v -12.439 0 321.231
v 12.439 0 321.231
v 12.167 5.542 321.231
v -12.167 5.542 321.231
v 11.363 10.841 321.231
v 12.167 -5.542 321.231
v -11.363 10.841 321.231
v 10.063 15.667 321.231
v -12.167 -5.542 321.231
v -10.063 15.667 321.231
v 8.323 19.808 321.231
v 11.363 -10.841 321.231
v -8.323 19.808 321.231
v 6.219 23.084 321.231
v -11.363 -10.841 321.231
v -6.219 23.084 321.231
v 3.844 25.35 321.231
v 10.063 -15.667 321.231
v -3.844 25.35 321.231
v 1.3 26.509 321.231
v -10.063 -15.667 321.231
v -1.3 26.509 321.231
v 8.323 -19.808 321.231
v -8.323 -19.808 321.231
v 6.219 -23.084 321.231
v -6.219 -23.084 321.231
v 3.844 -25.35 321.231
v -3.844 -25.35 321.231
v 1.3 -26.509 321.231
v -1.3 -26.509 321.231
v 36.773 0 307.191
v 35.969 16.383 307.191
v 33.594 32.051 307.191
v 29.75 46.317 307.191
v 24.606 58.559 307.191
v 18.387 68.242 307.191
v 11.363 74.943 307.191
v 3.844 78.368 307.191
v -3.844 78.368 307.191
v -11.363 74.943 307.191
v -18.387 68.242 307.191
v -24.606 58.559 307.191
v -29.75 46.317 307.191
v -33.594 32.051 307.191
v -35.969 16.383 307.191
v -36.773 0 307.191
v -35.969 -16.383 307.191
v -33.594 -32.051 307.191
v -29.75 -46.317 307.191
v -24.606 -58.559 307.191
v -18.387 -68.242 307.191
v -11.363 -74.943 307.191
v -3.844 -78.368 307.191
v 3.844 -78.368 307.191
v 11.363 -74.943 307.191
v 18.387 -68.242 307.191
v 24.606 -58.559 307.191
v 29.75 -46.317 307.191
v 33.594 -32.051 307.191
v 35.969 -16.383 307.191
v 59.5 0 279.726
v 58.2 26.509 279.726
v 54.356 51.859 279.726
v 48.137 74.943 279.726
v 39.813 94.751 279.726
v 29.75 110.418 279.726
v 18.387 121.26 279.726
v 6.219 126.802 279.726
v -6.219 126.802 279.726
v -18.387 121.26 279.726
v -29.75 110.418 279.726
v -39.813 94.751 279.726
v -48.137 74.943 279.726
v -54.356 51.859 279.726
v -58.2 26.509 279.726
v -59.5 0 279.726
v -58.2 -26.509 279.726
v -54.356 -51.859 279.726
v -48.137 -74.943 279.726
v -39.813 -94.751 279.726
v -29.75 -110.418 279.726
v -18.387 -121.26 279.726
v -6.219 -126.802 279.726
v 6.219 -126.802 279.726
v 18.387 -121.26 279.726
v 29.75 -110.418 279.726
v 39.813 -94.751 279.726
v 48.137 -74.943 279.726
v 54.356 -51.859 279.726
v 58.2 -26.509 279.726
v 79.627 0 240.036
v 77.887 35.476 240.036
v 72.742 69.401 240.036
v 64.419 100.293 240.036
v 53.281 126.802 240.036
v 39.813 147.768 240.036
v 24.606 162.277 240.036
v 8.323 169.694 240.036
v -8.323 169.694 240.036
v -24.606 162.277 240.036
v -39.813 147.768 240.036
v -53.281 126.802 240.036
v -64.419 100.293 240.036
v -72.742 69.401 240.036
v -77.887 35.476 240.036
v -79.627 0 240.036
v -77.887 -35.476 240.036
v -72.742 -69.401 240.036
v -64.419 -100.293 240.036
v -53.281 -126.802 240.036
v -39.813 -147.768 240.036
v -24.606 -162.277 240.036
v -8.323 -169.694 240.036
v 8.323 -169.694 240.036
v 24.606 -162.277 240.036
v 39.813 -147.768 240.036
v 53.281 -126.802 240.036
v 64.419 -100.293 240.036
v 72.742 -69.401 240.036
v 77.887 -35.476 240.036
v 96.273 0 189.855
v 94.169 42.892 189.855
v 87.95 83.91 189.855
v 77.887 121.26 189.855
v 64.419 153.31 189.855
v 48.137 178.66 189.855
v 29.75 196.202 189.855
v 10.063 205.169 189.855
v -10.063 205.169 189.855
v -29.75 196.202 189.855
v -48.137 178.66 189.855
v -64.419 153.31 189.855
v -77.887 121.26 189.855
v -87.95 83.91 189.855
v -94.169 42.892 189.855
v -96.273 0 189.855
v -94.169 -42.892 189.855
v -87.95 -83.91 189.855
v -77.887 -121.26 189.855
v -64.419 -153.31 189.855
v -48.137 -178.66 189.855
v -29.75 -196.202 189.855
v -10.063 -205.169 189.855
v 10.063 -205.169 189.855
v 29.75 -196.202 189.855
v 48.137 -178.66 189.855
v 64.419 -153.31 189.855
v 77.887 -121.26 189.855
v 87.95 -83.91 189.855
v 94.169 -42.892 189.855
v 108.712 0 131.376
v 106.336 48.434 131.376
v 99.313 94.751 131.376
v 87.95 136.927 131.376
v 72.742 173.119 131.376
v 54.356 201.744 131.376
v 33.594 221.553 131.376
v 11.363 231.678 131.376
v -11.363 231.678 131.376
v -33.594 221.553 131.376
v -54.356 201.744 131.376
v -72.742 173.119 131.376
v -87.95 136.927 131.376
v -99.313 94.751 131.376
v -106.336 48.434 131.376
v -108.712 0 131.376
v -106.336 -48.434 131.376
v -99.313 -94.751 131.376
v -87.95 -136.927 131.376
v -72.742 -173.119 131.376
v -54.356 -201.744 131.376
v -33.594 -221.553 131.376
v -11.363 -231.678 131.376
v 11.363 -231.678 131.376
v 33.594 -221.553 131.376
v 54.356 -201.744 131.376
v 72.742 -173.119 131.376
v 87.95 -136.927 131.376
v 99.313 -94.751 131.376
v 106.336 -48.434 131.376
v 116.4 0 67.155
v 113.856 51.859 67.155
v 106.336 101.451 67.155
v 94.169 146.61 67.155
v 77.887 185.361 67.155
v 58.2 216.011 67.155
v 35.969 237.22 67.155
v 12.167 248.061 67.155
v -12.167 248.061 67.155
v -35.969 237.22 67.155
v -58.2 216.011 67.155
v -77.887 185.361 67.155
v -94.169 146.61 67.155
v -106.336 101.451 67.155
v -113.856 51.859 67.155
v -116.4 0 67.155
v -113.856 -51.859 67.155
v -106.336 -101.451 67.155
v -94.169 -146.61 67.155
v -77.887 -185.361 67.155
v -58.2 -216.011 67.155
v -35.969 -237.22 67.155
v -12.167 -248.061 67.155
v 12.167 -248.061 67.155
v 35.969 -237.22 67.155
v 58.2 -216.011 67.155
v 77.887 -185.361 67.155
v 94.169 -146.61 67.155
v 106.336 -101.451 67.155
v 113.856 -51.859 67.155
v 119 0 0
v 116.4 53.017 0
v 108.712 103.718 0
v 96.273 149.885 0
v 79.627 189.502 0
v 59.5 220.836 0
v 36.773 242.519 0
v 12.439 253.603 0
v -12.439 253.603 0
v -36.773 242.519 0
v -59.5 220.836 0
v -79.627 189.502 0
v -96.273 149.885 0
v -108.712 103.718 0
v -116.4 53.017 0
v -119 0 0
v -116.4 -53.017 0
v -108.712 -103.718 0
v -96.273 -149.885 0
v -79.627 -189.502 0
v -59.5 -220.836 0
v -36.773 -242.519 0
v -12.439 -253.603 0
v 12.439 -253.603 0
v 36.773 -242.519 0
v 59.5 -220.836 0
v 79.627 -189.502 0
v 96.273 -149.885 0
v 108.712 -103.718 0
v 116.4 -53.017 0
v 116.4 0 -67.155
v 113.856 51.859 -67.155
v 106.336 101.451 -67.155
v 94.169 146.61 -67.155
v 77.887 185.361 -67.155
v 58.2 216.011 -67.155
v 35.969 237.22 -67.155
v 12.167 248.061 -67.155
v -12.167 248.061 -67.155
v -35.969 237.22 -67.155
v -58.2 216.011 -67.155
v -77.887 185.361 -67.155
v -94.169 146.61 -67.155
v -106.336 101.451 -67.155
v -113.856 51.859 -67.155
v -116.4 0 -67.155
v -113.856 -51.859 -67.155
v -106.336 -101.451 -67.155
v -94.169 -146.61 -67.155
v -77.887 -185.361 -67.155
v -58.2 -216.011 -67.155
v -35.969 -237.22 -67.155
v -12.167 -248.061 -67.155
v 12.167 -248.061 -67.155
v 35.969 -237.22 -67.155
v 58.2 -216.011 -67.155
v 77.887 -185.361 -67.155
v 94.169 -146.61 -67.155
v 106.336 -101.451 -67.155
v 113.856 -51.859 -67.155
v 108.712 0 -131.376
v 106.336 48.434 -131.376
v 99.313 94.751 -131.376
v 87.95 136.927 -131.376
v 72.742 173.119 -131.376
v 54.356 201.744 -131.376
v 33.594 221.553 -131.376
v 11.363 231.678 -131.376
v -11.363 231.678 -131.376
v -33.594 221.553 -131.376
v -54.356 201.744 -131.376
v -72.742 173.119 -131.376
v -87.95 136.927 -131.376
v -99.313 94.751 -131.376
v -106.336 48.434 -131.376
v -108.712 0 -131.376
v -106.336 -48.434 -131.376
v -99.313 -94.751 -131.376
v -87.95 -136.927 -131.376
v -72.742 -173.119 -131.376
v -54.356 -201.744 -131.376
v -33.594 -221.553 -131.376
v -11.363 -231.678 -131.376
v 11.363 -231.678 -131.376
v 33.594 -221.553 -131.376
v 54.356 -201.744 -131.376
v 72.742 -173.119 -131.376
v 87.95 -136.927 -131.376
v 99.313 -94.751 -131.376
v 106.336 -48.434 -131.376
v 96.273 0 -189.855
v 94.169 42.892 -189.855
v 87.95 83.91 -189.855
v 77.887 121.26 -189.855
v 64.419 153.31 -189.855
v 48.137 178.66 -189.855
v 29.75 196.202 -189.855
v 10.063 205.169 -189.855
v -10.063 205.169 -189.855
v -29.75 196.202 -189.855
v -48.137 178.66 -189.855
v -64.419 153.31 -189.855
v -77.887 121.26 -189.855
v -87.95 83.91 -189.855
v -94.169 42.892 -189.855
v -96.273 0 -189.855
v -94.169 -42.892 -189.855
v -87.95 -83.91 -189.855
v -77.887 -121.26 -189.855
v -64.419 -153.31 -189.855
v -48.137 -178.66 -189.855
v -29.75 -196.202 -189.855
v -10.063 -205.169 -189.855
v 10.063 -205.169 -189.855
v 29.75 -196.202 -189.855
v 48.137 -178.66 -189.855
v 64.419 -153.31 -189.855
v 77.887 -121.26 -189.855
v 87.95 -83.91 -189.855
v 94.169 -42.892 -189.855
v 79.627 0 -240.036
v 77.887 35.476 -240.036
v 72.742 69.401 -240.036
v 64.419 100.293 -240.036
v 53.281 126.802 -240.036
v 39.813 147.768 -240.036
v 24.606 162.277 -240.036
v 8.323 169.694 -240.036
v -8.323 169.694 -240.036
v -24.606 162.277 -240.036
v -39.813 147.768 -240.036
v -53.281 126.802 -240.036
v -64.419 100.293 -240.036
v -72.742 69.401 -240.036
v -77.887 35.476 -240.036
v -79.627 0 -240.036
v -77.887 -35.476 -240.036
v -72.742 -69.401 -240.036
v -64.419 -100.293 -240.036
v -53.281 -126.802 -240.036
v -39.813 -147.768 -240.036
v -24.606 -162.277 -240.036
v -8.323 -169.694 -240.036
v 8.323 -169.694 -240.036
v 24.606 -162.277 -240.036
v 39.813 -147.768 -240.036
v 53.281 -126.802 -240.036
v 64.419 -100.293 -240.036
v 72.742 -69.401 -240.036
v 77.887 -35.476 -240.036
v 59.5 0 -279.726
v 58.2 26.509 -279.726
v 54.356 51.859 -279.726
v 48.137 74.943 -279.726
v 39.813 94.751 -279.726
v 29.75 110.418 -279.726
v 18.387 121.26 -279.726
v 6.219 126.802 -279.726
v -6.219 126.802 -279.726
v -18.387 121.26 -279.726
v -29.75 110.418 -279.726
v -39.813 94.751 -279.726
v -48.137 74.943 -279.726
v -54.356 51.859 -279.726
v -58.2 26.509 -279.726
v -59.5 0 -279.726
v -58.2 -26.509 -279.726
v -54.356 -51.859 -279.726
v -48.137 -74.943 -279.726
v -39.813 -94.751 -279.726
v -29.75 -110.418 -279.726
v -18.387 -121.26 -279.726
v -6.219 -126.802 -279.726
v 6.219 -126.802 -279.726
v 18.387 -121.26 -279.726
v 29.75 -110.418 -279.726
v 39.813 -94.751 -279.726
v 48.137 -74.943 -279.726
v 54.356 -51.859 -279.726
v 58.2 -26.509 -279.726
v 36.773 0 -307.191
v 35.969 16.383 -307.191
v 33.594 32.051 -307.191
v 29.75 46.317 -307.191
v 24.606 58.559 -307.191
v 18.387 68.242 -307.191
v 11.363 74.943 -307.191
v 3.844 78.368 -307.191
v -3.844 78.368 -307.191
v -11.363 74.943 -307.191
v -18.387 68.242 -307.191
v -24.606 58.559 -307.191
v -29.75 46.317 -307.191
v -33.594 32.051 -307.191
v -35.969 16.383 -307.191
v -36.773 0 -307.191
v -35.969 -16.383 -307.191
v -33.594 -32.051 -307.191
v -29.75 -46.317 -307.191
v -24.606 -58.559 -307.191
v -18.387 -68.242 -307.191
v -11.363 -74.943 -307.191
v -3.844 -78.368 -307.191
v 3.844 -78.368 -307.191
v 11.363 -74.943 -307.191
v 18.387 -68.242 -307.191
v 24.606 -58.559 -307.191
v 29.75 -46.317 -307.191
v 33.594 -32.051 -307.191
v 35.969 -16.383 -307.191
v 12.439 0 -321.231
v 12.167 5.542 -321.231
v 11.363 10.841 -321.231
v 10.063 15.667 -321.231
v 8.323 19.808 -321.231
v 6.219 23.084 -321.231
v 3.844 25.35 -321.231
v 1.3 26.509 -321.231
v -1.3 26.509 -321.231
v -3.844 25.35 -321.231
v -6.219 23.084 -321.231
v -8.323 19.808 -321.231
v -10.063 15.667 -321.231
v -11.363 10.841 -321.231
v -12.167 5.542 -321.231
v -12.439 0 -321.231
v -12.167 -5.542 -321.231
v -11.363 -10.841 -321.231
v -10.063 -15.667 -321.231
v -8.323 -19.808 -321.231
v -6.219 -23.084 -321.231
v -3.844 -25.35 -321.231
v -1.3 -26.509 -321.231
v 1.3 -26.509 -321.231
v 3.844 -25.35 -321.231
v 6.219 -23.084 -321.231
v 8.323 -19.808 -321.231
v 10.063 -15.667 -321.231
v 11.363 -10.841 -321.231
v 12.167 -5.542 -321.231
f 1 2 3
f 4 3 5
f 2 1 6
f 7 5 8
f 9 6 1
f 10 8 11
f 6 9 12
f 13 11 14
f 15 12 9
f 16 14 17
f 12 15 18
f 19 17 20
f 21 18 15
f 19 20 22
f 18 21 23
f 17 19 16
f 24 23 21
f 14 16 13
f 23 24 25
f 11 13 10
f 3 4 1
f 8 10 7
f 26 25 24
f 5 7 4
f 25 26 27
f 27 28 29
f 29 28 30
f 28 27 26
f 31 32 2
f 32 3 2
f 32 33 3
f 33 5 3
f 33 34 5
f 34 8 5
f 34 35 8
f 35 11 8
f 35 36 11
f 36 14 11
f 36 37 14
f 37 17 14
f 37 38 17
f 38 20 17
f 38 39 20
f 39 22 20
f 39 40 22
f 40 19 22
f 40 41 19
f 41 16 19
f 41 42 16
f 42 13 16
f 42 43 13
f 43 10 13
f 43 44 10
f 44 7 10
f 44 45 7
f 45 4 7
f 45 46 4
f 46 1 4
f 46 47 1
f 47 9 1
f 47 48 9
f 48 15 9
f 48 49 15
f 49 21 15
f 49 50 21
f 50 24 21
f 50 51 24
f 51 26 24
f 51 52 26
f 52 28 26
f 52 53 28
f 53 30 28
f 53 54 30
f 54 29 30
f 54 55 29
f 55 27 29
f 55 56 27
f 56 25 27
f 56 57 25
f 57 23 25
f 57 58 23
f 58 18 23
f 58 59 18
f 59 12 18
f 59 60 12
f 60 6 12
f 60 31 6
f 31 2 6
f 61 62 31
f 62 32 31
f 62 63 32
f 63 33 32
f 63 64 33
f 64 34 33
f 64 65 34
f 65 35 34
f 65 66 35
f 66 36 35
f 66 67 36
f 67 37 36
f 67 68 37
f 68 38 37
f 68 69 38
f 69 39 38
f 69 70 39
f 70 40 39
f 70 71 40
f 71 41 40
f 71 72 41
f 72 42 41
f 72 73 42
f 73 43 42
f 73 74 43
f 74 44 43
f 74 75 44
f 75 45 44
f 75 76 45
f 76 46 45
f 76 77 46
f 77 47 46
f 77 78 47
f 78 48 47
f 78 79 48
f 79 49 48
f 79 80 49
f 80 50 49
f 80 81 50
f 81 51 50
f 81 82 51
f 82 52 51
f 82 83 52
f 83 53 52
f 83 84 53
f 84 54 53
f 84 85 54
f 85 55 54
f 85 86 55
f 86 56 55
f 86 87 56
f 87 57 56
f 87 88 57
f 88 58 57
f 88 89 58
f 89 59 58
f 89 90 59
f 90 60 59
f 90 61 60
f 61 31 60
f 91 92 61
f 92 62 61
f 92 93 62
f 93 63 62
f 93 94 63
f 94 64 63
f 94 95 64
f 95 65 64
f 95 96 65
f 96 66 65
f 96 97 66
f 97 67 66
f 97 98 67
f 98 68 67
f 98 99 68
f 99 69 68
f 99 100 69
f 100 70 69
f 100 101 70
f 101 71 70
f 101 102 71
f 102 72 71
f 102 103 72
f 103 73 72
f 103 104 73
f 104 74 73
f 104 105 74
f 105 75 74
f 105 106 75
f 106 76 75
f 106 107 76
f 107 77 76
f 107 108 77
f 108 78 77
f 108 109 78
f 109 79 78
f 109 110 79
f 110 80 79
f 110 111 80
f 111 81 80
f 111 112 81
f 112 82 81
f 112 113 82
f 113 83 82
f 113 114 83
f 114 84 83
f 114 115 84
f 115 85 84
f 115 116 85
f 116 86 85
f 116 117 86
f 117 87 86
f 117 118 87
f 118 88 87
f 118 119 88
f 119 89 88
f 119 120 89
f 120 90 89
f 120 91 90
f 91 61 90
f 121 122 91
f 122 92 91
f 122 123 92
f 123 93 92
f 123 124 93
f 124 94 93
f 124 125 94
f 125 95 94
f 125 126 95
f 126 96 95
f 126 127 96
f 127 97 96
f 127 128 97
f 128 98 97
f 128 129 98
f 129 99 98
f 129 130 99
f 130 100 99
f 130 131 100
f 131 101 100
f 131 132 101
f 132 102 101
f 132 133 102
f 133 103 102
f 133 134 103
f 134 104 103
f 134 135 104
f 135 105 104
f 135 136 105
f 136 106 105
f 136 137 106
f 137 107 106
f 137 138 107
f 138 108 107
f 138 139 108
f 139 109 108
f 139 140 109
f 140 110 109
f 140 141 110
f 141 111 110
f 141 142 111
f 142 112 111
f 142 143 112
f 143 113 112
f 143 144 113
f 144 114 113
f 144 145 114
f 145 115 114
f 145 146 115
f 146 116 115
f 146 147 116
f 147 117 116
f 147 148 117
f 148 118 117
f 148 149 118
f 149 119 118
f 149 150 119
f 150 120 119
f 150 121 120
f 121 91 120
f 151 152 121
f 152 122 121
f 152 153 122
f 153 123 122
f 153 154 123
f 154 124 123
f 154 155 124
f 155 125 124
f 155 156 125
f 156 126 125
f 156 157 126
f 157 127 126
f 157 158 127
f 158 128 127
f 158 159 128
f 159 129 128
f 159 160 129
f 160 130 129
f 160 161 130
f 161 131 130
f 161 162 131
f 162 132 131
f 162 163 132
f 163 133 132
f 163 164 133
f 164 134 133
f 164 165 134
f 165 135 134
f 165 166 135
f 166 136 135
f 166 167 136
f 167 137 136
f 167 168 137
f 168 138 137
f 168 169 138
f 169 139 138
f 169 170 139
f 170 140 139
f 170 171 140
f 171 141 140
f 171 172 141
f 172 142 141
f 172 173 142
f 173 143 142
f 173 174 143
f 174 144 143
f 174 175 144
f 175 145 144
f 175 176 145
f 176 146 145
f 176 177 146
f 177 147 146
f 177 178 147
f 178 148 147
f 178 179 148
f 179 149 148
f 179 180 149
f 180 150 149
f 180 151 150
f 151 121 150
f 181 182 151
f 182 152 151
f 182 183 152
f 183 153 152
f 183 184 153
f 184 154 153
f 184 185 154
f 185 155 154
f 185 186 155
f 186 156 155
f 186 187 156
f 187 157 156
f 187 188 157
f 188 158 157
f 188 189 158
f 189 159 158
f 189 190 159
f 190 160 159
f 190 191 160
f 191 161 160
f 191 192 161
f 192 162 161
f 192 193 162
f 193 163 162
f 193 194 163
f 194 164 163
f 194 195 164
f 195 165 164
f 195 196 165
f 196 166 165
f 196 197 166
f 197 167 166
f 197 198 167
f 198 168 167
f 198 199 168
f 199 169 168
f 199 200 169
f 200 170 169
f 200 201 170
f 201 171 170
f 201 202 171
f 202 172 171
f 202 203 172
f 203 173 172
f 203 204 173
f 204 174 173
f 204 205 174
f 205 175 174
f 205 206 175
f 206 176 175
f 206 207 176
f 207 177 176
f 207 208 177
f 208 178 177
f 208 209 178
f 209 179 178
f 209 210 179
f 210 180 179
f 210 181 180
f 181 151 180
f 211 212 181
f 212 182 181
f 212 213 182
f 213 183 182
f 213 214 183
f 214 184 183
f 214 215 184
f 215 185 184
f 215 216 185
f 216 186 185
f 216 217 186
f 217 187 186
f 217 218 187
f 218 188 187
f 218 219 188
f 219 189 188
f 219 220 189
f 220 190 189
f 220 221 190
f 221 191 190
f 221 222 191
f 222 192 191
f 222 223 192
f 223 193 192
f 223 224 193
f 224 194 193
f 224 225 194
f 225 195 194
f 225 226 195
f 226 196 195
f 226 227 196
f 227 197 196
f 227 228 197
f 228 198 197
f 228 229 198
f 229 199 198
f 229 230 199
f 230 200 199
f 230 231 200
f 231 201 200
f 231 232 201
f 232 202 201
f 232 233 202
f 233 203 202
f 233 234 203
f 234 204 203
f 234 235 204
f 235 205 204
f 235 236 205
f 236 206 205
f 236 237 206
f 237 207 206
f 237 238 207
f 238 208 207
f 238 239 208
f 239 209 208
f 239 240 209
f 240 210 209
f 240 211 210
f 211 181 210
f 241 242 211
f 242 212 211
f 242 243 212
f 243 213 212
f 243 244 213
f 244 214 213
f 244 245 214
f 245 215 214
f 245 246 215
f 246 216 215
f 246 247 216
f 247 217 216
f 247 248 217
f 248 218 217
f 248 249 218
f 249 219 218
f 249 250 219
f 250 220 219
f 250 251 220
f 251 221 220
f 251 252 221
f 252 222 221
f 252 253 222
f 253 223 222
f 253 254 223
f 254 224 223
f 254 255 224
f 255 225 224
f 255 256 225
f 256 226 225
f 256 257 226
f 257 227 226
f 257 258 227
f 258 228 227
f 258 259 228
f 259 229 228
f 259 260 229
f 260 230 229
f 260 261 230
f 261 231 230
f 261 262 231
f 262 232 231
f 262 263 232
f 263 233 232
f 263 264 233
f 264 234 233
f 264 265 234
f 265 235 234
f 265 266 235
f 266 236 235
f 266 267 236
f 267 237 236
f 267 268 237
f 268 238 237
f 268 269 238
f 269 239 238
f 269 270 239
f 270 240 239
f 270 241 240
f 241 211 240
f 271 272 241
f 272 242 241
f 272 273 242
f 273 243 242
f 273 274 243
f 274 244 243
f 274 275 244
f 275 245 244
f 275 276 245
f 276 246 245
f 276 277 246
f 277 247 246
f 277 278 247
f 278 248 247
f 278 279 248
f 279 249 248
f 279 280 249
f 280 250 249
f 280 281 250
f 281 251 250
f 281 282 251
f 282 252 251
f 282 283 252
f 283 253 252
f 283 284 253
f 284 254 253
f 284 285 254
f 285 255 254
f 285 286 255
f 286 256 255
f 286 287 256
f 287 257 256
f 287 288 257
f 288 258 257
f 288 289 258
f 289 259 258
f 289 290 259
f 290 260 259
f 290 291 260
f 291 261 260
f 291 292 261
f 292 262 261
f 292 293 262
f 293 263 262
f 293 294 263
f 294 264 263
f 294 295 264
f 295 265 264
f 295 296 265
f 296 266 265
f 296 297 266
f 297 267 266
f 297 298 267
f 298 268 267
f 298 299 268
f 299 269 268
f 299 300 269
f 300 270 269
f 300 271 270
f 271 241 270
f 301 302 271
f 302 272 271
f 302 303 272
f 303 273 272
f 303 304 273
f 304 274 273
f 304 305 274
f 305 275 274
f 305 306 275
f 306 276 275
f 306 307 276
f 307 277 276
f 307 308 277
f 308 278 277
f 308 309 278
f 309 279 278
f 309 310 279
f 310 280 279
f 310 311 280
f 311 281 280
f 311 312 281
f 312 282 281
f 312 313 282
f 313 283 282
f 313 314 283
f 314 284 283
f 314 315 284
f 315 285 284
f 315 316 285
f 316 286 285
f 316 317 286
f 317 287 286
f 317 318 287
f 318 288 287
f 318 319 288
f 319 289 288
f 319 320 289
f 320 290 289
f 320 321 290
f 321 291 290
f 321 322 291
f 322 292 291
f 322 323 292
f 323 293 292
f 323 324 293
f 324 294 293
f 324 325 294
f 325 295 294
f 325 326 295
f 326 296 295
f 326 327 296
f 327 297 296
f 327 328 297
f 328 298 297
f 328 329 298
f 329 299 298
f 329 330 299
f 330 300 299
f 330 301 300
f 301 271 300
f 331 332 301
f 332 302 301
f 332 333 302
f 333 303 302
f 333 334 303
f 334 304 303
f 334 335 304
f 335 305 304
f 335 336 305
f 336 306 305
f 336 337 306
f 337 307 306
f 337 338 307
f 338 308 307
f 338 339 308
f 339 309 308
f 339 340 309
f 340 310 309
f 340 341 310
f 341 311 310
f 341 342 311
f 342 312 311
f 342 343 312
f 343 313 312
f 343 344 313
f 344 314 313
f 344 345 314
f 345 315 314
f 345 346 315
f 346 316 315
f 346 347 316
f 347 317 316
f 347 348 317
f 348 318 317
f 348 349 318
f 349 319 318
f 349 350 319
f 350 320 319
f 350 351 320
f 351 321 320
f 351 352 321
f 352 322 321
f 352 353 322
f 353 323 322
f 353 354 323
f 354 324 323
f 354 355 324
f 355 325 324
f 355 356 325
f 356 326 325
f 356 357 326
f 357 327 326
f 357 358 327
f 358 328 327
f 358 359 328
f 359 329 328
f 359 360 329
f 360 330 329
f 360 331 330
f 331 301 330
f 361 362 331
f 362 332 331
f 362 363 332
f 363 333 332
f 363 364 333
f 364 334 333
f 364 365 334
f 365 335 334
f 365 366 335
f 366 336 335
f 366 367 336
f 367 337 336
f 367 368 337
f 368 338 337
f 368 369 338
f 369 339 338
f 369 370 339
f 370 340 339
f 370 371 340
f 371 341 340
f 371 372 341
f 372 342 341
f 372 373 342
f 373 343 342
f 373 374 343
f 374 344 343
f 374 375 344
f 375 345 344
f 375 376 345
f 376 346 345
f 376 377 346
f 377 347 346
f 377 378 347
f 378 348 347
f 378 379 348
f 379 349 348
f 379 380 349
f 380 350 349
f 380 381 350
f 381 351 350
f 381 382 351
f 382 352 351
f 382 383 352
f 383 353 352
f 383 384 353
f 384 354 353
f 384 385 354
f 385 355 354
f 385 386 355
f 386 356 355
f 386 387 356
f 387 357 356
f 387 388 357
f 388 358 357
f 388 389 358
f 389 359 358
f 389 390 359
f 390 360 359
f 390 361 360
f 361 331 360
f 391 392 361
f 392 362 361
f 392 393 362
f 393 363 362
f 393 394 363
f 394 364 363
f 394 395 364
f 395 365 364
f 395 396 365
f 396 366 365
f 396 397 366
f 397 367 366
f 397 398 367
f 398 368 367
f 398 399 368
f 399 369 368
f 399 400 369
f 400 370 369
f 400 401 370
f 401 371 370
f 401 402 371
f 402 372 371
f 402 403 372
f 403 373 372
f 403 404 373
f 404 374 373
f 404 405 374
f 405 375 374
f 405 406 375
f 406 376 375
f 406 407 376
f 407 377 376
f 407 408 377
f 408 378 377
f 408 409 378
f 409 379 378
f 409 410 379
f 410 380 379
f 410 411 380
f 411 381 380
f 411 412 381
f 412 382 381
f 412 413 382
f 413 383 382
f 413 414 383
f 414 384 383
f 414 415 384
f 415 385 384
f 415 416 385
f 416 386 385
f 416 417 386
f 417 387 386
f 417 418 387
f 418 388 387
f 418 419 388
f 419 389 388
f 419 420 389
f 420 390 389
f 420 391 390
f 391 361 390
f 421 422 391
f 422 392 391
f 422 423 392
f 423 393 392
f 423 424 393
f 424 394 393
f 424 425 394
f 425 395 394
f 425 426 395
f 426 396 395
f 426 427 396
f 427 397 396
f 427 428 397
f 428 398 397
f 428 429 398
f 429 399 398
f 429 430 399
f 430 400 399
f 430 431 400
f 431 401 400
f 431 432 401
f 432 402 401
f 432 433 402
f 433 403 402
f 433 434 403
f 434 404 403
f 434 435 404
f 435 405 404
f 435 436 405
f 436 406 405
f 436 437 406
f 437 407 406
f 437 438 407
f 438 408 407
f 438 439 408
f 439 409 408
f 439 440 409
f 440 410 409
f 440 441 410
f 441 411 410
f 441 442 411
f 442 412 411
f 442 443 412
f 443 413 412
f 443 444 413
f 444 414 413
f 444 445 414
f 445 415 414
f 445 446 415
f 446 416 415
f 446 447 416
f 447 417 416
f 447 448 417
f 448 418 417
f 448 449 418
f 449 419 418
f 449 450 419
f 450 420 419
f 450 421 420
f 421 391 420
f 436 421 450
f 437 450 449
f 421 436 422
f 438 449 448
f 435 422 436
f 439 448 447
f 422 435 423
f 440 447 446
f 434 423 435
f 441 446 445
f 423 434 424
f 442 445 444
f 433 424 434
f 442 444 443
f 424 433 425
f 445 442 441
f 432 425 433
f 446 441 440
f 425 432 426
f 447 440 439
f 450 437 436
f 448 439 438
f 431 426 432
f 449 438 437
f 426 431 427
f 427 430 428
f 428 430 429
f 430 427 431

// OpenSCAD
// Generated by SolidPython 1.0.1 on 2020-07-29 00:46:48


scale(v = [7, 15, 19]) {
	sphere(r = 17);
}
/***********************************************
*********      SolidPython code:      **********
************************************************
 
# import packages: SolidPython
from solid import *
from solid.utils import *
from itertools import chain, combinations, permutations


class Resize:

    def __init__(self, scad_file):
        self.scad_file = scad_file
        #self.scad_file = import_scad(scad_file)
        # cone/cylinder param:
        self.r1 = 0
        self.r2 = 0
        self.h = 0
        # rectangular prism param:
        self.w = 0
        self.l = 0
        # ellipse param:
        self.r = 0

    # import OpenScad code (file name corresponds to shape)


    # classify shape + parameters
    def assign(self, param1, param2, param3):
        if self.scad_file == 'cone.scad':
            self.r1 = param1
            self.r2 = param2
            self.h = param3
        elif self.scad_file == 'cylinder.scad':
            self.r1 = param1
            self.r2 = param2
            self.h = param3
        elif self.scad_file == 'rectangularPrism.scad':
            self.h = param1
            self.l = param2
            self.w = param3
        else:
            self.r = param1
            self.h = param2

    # resize parameters
    def iterate(self):
        x = range(3, 20, 2)
        i = 1
        if self.scad_file == 'cone.scad':
            tempList = list(permutations(x, 2))
            for temp in tempList:
                param1 = temp[0]
                param2 = temp[1]
                filepath = 'produced_scad_files/' + 'cone' + str(param1) + '_' + str(param2) + '_' + '.scad'
                scad_render_to_file(cylinder(h=param1, r1=param2, r2=0), filepath)

        elif self.scad_file == 'cylinder.scad':
            tempList = list(permutations(x, 3))
            for temp in tempList:
                param1 = temp[0]
                param2 = temp[1]
                filepath = 'produced_scad_files/' + 'cylinder' + str(param1) + '_' + str(param2) + '_' + '.scad'
                scad_render_to_file(cylinder(h=param1, r1=param2, r2=param2), filepath)

        elif self.scad_file == 'rectangularPrism.scad':
            tempList = list(permutations(x, 3))
            for temp in tempList:
                param1 = temp[0]
                param2 = temp[1]
                param3 = temp[2]
                filepath = 'produced_scad_files/' + 'rectangularPrism' + str(param1) + '_' + str(param2) + '_' + str(
                    param3) + '.scad'
                scad_render_to_file(cube(size=(param1, param2, param3)), filepath)

        elif self.scad_file == 'ellipse.scad':
            tempList = list(permutations(x, 4))
            for temp in tempList:
                param1 = temp[0]
                param2 = temp[1]
                param3 = temp[2]
                param4 = temp[3]
                filepath = 'produced_scad_files/' + 'ellipse' + str(param1) + '_' + str(param2) + '_' + str(param3) + '_' + str(param4) + '.scad'
                scad_render_to_file(scale([param1, param2, param3])(sphere(r=param4)), filepath)

    def render_to_scadfile(self):
        scad_render_to_file(scad, 'example.scad') 
 
************************************************/
